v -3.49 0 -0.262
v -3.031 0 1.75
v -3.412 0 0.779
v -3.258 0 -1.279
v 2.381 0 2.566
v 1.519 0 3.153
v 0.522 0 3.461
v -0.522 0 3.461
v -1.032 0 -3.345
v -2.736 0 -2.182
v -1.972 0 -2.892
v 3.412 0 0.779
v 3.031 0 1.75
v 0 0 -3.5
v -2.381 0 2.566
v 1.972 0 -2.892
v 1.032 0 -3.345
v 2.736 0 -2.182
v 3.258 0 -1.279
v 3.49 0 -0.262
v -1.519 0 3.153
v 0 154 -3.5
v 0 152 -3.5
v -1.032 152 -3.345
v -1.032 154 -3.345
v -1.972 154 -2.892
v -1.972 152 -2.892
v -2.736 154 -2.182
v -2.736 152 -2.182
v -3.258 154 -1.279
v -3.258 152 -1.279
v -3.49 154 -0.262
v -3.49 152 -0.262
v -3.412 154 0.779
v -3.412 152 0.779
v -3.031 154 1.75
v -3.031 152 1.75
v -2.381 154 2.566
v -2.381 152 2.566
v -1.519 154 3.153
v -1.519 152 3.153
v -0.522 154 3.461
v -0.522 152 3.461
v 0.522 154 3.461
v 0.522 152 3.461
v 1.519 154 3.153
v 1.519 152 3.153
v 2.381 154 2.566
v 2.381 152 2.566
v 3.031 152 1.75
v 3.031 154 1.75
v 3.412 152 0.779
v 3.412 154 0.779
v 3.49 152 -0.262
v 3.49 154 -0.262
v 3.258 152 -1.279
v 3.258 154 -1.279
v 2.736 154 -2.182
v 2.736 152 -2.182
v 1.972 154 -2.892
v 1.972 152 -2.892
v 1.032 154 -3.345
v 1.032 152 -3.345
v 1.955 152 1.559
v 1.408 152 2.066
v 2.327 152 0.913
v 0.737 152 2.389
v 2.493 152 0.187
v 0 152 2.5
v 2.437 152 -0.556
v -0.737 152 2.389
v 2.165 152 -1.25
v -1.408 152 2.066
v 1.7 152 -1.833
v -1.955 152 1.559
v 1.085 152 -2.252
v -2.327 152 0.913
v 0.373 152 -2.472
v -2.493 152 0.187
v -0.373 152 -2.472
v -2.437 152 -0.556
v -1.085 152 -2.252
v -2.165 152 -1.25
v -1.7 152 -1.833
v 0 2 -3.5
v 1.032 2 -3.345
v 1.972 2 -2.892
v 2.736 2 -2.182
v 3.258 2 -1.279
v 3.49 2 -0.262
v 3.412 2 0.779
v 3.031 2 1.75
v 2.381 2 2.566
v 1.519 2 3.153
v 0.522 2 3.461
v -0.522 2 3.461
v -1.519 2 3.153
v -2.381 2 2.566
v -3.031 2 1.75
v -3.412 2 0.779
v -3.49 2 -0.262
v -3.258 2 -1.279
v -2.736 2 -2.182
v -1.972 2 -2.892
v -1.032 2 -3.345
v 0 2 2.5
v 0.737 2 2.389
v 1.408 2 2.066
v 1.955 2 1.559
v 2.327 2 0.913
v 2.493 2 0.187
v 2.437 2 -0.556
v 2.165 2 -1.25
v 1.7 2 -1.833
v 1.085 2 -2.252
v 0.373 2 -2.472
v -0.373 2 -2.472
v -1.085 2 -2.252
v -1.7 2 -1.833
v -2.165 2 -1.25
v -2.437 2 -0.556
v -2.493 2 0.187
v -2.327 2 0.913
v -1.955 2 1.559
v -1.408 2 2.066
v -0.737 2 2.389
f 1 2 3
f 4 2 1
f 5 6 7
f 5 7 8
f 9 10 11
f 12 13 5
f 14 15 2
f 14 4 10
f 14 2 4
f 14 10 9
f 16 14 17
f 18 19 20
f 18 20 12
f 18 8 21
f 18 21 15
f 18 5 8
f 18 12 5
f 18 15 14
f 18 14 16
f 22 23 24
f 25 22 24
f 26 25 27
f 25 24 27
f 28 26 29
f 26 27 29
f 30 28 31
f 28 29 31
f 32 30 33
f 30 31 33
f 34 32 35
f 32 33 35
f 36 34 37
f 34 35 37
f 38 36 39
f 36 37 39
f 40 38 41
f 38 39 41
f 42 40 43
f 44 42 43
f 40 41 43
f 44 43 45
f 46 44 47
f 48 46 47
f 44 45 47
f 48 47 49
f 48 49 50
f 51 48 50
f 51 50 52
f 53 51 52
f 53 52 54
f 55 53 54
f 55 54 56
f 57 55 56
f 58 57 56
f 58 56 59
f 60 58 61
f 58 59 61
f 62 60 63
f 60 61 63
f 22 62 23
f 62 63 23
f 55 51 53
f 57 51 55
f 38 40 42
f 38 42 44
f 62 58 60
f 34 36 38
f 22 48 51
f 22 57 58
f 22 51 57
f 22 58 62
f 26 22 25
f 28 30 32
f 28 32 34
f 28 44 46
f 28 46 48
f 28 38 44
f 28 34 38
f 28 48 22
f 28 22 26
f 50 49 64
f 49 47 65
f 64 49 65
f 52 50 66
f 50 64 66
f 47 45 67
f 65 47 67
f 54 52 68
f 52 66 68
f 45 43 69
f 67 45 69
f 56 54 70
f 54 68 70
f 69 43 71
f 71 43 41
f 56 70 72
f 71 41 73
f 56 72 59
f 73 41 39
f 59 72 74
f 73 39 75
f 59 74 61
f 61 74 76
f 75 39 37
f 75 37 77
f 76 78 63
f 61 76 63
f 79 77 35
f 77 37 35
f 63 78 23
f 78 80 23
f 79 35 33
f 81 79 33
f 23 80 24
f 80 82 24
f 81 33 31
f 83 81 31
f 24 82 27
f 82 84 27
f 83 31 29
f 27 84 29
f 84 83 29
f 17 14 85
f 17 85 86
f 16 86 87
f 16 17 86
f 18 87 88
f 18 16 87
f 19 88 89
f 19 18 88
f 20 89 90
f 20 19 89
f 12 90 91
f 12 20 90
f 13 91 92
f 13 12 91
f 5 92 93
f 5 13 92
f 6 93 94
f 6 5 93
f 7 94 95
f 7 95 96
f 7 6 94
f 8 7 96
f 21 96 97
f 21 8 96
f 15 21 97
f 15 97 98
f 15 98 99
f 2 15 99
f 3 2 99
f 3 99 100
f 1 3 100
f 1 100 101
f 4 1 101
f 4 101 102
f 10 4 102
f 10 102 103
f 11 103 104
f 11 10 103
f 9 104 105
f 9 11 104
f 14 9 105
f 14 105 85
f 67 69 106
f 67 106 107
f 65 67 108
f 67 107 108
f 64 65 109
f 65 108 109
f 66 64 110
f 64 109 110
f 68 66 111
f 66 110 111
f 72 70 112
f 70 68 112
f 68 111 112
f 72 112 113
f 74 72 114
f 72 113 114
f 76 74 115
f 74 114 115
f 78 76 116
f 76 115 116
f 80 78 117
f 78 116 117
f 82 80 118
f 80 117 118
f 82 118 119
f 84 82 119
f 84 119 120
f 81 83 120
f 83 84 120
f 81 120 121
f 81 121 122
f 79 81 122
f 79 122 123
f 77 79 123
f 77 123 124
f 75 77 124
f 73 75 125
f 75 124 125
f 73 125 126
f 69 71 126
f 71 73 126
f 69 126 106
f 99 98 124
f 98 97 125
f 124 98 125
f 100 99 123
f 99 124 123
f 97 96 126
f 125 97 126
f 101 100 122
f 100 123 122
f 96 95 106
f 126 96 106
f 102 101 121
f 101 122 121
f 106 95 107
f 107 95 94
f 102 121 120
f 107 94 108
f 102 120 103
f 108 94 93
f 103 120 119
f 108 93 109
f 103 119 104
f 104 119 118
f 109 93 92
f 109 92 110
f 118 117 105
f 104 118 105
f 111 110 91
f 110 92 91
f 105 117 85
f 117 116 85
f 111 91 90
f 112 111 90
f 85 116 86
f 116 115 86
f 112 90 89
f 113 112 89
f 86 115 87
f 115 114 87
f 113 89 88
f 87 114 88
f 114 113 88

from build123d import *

# Parameters (mm, degrees)
SKETCH1_R           = 2.5
BOSS_EXTRUDE1_DEPTH = 154
SKETCH2_R           = 3.5
BOSS_EXTRUDE2_DEPTH = 2
BOSS_EXTRUDE3_START = -2
SKETCH3_R           = 3.5
BOSS_EXTRUDE3_DEPTH = 2


with BuildPart() as part:
    # Sketch1 → Boss-Extrude1 (new body)
    with BuildSketch(Plane(origin=(0, 0, 0), x_dir=(1, 0, 0), z_dir=(0, 1, 0))):
        with Locations(Location((0, 0, 0), (0, 0, 270))):
            Circle(SKETCH1_R)
    extrude(amount=BOSS_EXTRUDE1_DEPTH)

    # Sketch2 → Boss-Extrude2 (add)
    with BuildSketch(Plane.XZ):
        with Locations(Location((0, 0, 0), (0, 0, 270))):
            Circle(SKETCH2_R)
    extrude(amount=-BOSS_EXTRUDE2_DEPTH)

    # Sketch3 → Boss-Extrude3 (add)
    with BuildSketch(Plane(origin=(0, 154, 0), x_dir=(1, 0, 0), z_dir=(0, 1, 0)).offset(BOSS_EXTRUDE3_START)):
        with Locations(Location((0, 0, 0), (0, 0, 90))):
            Circle(SKETCH3_R)
    extrude(amount=BOSS_EXTRUDE3_DEPTH)


solid = part.part
